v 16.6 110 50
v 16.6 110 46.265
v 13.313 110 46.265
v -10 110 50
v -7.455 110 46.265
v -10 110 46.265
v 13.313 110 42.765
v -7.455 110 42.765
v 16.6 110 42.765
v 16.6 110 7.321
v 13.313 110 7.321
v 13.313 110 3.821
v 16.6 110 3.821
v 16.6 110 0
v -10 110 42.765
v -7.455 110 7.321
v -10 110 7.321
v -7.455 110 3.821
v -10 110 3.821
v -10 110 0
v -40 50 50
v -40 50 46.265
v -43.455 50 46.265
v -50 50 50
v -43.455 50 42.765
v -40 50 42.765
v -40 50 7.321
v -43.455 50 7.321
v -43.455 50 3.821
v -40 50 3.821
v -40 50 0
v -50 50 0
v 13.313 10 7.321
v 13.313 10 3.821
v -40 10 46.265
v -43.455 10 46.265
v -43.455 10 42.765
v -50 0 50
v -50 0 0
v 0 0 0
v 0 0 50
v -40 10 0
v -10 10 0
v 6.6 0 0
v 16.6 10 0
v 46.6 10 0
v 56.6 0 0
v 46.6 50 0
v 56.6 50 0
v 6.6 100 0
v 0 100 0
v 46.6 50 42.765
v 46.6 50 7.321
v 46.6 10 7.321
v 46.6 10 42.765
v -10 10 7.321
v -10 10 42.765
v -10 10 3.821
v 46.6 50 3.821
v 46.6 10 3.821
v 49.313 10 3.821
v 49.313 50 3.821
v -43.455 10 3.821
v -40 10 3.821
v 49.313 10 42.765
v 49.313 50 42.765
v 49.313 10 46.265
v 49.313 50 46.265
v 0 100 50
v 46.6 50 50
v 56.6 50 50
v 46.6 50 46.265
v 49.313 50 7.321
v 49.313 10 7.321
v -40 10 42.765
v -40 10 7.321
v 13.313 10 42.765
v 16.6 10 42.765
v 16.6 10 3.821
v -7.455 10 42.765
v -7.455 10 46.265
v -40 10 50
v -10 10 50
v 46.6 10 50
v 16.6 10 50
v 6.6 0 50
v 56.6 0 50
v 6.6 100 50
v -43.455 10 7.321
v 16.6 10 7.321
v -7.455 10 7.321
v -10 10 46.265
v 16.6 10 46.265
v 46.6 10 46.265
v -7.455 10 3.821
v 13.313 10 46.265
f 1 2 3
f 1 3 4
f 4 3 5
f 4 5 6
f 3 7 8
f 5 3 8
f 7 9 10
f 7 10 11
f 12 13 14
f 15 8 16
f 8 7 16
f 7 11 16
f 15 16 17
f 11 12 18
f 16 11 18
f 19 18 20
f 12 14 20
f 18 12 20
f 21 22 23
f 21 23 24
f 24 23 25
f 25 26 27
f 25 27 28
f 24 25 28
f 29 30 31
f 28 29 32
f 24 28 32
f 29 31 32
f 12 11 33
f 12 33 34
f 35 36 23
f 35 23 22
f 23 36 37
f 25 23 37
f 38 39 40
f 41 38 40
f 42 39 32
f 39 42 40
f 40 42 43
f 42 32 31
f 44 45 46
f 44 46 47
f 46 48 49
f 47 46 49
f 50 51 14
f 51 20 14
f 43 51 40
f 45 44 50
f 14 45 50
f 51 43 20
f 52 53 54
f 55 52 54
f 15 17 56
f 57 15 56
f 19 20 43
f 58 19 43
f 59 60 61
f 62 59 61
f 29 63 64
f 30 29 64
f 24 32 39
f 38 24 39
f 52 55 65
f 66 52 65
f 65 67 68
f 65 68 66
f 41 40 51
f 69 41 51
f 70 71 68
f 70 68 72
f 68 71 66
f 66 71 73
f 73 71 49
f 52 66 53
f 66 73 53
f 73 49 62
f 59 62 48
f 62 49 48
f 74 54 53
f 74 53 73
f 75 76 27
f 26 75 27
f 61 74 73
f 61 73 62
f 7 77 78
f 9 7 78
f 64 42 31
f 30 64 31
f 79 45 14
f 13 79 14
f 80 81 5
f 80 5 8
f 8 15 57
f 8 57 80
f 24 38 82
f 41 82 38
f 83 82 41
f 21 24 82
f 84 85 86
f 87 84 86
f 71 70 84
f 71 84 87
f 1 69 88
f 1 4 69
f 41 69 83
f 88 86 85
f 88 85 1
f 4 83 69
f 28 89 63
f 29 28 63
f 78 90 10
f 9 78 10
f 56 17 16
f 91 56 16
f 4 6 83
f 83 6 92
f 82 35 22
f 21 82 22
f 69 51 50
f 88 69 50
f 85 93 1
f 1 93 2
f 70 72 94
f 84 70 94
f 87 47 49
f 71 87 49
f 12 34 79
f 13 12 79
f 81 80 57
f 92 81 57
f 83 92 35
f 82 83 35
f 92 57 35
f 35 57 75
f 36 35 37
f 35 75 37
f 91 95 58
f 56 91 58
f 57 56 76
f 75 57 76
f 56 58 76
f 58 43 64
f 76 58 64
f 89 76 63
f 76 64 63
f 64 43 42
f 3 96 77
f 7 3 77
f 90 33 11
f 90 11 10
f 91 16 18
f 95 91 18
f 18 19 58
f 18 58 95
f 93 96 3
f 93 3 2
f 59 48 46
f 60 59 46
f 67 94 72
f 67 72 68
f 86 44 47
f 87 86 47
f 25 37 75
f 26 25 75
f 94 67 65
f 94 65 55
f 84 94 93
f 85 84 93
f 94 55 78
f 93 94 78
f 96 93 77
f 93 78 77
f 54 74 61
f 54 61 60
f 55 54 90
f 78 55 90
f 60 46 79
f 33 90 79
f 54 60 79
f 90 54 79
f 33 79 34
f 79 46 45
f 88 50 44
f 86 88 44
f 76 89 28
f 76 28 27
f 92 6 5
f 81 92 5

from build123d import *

# Parameters (mm, degrees)
EXTRU_MINCE1_DEPTH      = 50
ESQUISSE2_W             = 36
ESQUISSE2_H             = 3.5
ENL_V_MAT_EXTRU_1_DEPTH = 100


with BuildPart() as part:
    # Esquisse1 → Extru.-Mince1 (new body)
    with BuildSketch(Plane.XY):
        Polygon((-50, 50), (-50, 0), (0, 0), (0, 100), (6.6, 100), (6.6, 0), (56.6, 0), (56.6, 50), (46.6, 50), (46.6, 10), (16.6, 10), (16.6, 110), (-10, 110), (-10, 10), (-40, 10), (-40, 50), align=None)
    extrude(amount=EXTRU_MINCE1_DEPTH)

    # Esquisse2 → Enlèv. mat.-Extru.1 (cut)
    with BuildSketch(Plane(origin=(0, 10, 0), x_dir=(1, 0, 0), z_dir=(0, 1, 0))):
        with Locations((-25.454999668, -5.571109307)):
            Rectangle(ESQUISSE2_W, ESQUISSE2_H)
        with Locations((-25.454999668, -44.515273736)):
            Rectangle(ESQUISSE2_W, ESQUISSE2_H)
        with Locations((31.312560908, -5.571109307)):
            Rectangle(ESQUISSE2_W, ESQUISSE2_H)
        with Locations((31.312560908, -44.515273736)):
            Rectangle(ESQUISSE2_W, ESQUISSE2_H)
    extrude(amount=ENL_V_MAT_EXTRU_1_DEPTH, mode=Mode.SUBTRACT)


solid = part.part
